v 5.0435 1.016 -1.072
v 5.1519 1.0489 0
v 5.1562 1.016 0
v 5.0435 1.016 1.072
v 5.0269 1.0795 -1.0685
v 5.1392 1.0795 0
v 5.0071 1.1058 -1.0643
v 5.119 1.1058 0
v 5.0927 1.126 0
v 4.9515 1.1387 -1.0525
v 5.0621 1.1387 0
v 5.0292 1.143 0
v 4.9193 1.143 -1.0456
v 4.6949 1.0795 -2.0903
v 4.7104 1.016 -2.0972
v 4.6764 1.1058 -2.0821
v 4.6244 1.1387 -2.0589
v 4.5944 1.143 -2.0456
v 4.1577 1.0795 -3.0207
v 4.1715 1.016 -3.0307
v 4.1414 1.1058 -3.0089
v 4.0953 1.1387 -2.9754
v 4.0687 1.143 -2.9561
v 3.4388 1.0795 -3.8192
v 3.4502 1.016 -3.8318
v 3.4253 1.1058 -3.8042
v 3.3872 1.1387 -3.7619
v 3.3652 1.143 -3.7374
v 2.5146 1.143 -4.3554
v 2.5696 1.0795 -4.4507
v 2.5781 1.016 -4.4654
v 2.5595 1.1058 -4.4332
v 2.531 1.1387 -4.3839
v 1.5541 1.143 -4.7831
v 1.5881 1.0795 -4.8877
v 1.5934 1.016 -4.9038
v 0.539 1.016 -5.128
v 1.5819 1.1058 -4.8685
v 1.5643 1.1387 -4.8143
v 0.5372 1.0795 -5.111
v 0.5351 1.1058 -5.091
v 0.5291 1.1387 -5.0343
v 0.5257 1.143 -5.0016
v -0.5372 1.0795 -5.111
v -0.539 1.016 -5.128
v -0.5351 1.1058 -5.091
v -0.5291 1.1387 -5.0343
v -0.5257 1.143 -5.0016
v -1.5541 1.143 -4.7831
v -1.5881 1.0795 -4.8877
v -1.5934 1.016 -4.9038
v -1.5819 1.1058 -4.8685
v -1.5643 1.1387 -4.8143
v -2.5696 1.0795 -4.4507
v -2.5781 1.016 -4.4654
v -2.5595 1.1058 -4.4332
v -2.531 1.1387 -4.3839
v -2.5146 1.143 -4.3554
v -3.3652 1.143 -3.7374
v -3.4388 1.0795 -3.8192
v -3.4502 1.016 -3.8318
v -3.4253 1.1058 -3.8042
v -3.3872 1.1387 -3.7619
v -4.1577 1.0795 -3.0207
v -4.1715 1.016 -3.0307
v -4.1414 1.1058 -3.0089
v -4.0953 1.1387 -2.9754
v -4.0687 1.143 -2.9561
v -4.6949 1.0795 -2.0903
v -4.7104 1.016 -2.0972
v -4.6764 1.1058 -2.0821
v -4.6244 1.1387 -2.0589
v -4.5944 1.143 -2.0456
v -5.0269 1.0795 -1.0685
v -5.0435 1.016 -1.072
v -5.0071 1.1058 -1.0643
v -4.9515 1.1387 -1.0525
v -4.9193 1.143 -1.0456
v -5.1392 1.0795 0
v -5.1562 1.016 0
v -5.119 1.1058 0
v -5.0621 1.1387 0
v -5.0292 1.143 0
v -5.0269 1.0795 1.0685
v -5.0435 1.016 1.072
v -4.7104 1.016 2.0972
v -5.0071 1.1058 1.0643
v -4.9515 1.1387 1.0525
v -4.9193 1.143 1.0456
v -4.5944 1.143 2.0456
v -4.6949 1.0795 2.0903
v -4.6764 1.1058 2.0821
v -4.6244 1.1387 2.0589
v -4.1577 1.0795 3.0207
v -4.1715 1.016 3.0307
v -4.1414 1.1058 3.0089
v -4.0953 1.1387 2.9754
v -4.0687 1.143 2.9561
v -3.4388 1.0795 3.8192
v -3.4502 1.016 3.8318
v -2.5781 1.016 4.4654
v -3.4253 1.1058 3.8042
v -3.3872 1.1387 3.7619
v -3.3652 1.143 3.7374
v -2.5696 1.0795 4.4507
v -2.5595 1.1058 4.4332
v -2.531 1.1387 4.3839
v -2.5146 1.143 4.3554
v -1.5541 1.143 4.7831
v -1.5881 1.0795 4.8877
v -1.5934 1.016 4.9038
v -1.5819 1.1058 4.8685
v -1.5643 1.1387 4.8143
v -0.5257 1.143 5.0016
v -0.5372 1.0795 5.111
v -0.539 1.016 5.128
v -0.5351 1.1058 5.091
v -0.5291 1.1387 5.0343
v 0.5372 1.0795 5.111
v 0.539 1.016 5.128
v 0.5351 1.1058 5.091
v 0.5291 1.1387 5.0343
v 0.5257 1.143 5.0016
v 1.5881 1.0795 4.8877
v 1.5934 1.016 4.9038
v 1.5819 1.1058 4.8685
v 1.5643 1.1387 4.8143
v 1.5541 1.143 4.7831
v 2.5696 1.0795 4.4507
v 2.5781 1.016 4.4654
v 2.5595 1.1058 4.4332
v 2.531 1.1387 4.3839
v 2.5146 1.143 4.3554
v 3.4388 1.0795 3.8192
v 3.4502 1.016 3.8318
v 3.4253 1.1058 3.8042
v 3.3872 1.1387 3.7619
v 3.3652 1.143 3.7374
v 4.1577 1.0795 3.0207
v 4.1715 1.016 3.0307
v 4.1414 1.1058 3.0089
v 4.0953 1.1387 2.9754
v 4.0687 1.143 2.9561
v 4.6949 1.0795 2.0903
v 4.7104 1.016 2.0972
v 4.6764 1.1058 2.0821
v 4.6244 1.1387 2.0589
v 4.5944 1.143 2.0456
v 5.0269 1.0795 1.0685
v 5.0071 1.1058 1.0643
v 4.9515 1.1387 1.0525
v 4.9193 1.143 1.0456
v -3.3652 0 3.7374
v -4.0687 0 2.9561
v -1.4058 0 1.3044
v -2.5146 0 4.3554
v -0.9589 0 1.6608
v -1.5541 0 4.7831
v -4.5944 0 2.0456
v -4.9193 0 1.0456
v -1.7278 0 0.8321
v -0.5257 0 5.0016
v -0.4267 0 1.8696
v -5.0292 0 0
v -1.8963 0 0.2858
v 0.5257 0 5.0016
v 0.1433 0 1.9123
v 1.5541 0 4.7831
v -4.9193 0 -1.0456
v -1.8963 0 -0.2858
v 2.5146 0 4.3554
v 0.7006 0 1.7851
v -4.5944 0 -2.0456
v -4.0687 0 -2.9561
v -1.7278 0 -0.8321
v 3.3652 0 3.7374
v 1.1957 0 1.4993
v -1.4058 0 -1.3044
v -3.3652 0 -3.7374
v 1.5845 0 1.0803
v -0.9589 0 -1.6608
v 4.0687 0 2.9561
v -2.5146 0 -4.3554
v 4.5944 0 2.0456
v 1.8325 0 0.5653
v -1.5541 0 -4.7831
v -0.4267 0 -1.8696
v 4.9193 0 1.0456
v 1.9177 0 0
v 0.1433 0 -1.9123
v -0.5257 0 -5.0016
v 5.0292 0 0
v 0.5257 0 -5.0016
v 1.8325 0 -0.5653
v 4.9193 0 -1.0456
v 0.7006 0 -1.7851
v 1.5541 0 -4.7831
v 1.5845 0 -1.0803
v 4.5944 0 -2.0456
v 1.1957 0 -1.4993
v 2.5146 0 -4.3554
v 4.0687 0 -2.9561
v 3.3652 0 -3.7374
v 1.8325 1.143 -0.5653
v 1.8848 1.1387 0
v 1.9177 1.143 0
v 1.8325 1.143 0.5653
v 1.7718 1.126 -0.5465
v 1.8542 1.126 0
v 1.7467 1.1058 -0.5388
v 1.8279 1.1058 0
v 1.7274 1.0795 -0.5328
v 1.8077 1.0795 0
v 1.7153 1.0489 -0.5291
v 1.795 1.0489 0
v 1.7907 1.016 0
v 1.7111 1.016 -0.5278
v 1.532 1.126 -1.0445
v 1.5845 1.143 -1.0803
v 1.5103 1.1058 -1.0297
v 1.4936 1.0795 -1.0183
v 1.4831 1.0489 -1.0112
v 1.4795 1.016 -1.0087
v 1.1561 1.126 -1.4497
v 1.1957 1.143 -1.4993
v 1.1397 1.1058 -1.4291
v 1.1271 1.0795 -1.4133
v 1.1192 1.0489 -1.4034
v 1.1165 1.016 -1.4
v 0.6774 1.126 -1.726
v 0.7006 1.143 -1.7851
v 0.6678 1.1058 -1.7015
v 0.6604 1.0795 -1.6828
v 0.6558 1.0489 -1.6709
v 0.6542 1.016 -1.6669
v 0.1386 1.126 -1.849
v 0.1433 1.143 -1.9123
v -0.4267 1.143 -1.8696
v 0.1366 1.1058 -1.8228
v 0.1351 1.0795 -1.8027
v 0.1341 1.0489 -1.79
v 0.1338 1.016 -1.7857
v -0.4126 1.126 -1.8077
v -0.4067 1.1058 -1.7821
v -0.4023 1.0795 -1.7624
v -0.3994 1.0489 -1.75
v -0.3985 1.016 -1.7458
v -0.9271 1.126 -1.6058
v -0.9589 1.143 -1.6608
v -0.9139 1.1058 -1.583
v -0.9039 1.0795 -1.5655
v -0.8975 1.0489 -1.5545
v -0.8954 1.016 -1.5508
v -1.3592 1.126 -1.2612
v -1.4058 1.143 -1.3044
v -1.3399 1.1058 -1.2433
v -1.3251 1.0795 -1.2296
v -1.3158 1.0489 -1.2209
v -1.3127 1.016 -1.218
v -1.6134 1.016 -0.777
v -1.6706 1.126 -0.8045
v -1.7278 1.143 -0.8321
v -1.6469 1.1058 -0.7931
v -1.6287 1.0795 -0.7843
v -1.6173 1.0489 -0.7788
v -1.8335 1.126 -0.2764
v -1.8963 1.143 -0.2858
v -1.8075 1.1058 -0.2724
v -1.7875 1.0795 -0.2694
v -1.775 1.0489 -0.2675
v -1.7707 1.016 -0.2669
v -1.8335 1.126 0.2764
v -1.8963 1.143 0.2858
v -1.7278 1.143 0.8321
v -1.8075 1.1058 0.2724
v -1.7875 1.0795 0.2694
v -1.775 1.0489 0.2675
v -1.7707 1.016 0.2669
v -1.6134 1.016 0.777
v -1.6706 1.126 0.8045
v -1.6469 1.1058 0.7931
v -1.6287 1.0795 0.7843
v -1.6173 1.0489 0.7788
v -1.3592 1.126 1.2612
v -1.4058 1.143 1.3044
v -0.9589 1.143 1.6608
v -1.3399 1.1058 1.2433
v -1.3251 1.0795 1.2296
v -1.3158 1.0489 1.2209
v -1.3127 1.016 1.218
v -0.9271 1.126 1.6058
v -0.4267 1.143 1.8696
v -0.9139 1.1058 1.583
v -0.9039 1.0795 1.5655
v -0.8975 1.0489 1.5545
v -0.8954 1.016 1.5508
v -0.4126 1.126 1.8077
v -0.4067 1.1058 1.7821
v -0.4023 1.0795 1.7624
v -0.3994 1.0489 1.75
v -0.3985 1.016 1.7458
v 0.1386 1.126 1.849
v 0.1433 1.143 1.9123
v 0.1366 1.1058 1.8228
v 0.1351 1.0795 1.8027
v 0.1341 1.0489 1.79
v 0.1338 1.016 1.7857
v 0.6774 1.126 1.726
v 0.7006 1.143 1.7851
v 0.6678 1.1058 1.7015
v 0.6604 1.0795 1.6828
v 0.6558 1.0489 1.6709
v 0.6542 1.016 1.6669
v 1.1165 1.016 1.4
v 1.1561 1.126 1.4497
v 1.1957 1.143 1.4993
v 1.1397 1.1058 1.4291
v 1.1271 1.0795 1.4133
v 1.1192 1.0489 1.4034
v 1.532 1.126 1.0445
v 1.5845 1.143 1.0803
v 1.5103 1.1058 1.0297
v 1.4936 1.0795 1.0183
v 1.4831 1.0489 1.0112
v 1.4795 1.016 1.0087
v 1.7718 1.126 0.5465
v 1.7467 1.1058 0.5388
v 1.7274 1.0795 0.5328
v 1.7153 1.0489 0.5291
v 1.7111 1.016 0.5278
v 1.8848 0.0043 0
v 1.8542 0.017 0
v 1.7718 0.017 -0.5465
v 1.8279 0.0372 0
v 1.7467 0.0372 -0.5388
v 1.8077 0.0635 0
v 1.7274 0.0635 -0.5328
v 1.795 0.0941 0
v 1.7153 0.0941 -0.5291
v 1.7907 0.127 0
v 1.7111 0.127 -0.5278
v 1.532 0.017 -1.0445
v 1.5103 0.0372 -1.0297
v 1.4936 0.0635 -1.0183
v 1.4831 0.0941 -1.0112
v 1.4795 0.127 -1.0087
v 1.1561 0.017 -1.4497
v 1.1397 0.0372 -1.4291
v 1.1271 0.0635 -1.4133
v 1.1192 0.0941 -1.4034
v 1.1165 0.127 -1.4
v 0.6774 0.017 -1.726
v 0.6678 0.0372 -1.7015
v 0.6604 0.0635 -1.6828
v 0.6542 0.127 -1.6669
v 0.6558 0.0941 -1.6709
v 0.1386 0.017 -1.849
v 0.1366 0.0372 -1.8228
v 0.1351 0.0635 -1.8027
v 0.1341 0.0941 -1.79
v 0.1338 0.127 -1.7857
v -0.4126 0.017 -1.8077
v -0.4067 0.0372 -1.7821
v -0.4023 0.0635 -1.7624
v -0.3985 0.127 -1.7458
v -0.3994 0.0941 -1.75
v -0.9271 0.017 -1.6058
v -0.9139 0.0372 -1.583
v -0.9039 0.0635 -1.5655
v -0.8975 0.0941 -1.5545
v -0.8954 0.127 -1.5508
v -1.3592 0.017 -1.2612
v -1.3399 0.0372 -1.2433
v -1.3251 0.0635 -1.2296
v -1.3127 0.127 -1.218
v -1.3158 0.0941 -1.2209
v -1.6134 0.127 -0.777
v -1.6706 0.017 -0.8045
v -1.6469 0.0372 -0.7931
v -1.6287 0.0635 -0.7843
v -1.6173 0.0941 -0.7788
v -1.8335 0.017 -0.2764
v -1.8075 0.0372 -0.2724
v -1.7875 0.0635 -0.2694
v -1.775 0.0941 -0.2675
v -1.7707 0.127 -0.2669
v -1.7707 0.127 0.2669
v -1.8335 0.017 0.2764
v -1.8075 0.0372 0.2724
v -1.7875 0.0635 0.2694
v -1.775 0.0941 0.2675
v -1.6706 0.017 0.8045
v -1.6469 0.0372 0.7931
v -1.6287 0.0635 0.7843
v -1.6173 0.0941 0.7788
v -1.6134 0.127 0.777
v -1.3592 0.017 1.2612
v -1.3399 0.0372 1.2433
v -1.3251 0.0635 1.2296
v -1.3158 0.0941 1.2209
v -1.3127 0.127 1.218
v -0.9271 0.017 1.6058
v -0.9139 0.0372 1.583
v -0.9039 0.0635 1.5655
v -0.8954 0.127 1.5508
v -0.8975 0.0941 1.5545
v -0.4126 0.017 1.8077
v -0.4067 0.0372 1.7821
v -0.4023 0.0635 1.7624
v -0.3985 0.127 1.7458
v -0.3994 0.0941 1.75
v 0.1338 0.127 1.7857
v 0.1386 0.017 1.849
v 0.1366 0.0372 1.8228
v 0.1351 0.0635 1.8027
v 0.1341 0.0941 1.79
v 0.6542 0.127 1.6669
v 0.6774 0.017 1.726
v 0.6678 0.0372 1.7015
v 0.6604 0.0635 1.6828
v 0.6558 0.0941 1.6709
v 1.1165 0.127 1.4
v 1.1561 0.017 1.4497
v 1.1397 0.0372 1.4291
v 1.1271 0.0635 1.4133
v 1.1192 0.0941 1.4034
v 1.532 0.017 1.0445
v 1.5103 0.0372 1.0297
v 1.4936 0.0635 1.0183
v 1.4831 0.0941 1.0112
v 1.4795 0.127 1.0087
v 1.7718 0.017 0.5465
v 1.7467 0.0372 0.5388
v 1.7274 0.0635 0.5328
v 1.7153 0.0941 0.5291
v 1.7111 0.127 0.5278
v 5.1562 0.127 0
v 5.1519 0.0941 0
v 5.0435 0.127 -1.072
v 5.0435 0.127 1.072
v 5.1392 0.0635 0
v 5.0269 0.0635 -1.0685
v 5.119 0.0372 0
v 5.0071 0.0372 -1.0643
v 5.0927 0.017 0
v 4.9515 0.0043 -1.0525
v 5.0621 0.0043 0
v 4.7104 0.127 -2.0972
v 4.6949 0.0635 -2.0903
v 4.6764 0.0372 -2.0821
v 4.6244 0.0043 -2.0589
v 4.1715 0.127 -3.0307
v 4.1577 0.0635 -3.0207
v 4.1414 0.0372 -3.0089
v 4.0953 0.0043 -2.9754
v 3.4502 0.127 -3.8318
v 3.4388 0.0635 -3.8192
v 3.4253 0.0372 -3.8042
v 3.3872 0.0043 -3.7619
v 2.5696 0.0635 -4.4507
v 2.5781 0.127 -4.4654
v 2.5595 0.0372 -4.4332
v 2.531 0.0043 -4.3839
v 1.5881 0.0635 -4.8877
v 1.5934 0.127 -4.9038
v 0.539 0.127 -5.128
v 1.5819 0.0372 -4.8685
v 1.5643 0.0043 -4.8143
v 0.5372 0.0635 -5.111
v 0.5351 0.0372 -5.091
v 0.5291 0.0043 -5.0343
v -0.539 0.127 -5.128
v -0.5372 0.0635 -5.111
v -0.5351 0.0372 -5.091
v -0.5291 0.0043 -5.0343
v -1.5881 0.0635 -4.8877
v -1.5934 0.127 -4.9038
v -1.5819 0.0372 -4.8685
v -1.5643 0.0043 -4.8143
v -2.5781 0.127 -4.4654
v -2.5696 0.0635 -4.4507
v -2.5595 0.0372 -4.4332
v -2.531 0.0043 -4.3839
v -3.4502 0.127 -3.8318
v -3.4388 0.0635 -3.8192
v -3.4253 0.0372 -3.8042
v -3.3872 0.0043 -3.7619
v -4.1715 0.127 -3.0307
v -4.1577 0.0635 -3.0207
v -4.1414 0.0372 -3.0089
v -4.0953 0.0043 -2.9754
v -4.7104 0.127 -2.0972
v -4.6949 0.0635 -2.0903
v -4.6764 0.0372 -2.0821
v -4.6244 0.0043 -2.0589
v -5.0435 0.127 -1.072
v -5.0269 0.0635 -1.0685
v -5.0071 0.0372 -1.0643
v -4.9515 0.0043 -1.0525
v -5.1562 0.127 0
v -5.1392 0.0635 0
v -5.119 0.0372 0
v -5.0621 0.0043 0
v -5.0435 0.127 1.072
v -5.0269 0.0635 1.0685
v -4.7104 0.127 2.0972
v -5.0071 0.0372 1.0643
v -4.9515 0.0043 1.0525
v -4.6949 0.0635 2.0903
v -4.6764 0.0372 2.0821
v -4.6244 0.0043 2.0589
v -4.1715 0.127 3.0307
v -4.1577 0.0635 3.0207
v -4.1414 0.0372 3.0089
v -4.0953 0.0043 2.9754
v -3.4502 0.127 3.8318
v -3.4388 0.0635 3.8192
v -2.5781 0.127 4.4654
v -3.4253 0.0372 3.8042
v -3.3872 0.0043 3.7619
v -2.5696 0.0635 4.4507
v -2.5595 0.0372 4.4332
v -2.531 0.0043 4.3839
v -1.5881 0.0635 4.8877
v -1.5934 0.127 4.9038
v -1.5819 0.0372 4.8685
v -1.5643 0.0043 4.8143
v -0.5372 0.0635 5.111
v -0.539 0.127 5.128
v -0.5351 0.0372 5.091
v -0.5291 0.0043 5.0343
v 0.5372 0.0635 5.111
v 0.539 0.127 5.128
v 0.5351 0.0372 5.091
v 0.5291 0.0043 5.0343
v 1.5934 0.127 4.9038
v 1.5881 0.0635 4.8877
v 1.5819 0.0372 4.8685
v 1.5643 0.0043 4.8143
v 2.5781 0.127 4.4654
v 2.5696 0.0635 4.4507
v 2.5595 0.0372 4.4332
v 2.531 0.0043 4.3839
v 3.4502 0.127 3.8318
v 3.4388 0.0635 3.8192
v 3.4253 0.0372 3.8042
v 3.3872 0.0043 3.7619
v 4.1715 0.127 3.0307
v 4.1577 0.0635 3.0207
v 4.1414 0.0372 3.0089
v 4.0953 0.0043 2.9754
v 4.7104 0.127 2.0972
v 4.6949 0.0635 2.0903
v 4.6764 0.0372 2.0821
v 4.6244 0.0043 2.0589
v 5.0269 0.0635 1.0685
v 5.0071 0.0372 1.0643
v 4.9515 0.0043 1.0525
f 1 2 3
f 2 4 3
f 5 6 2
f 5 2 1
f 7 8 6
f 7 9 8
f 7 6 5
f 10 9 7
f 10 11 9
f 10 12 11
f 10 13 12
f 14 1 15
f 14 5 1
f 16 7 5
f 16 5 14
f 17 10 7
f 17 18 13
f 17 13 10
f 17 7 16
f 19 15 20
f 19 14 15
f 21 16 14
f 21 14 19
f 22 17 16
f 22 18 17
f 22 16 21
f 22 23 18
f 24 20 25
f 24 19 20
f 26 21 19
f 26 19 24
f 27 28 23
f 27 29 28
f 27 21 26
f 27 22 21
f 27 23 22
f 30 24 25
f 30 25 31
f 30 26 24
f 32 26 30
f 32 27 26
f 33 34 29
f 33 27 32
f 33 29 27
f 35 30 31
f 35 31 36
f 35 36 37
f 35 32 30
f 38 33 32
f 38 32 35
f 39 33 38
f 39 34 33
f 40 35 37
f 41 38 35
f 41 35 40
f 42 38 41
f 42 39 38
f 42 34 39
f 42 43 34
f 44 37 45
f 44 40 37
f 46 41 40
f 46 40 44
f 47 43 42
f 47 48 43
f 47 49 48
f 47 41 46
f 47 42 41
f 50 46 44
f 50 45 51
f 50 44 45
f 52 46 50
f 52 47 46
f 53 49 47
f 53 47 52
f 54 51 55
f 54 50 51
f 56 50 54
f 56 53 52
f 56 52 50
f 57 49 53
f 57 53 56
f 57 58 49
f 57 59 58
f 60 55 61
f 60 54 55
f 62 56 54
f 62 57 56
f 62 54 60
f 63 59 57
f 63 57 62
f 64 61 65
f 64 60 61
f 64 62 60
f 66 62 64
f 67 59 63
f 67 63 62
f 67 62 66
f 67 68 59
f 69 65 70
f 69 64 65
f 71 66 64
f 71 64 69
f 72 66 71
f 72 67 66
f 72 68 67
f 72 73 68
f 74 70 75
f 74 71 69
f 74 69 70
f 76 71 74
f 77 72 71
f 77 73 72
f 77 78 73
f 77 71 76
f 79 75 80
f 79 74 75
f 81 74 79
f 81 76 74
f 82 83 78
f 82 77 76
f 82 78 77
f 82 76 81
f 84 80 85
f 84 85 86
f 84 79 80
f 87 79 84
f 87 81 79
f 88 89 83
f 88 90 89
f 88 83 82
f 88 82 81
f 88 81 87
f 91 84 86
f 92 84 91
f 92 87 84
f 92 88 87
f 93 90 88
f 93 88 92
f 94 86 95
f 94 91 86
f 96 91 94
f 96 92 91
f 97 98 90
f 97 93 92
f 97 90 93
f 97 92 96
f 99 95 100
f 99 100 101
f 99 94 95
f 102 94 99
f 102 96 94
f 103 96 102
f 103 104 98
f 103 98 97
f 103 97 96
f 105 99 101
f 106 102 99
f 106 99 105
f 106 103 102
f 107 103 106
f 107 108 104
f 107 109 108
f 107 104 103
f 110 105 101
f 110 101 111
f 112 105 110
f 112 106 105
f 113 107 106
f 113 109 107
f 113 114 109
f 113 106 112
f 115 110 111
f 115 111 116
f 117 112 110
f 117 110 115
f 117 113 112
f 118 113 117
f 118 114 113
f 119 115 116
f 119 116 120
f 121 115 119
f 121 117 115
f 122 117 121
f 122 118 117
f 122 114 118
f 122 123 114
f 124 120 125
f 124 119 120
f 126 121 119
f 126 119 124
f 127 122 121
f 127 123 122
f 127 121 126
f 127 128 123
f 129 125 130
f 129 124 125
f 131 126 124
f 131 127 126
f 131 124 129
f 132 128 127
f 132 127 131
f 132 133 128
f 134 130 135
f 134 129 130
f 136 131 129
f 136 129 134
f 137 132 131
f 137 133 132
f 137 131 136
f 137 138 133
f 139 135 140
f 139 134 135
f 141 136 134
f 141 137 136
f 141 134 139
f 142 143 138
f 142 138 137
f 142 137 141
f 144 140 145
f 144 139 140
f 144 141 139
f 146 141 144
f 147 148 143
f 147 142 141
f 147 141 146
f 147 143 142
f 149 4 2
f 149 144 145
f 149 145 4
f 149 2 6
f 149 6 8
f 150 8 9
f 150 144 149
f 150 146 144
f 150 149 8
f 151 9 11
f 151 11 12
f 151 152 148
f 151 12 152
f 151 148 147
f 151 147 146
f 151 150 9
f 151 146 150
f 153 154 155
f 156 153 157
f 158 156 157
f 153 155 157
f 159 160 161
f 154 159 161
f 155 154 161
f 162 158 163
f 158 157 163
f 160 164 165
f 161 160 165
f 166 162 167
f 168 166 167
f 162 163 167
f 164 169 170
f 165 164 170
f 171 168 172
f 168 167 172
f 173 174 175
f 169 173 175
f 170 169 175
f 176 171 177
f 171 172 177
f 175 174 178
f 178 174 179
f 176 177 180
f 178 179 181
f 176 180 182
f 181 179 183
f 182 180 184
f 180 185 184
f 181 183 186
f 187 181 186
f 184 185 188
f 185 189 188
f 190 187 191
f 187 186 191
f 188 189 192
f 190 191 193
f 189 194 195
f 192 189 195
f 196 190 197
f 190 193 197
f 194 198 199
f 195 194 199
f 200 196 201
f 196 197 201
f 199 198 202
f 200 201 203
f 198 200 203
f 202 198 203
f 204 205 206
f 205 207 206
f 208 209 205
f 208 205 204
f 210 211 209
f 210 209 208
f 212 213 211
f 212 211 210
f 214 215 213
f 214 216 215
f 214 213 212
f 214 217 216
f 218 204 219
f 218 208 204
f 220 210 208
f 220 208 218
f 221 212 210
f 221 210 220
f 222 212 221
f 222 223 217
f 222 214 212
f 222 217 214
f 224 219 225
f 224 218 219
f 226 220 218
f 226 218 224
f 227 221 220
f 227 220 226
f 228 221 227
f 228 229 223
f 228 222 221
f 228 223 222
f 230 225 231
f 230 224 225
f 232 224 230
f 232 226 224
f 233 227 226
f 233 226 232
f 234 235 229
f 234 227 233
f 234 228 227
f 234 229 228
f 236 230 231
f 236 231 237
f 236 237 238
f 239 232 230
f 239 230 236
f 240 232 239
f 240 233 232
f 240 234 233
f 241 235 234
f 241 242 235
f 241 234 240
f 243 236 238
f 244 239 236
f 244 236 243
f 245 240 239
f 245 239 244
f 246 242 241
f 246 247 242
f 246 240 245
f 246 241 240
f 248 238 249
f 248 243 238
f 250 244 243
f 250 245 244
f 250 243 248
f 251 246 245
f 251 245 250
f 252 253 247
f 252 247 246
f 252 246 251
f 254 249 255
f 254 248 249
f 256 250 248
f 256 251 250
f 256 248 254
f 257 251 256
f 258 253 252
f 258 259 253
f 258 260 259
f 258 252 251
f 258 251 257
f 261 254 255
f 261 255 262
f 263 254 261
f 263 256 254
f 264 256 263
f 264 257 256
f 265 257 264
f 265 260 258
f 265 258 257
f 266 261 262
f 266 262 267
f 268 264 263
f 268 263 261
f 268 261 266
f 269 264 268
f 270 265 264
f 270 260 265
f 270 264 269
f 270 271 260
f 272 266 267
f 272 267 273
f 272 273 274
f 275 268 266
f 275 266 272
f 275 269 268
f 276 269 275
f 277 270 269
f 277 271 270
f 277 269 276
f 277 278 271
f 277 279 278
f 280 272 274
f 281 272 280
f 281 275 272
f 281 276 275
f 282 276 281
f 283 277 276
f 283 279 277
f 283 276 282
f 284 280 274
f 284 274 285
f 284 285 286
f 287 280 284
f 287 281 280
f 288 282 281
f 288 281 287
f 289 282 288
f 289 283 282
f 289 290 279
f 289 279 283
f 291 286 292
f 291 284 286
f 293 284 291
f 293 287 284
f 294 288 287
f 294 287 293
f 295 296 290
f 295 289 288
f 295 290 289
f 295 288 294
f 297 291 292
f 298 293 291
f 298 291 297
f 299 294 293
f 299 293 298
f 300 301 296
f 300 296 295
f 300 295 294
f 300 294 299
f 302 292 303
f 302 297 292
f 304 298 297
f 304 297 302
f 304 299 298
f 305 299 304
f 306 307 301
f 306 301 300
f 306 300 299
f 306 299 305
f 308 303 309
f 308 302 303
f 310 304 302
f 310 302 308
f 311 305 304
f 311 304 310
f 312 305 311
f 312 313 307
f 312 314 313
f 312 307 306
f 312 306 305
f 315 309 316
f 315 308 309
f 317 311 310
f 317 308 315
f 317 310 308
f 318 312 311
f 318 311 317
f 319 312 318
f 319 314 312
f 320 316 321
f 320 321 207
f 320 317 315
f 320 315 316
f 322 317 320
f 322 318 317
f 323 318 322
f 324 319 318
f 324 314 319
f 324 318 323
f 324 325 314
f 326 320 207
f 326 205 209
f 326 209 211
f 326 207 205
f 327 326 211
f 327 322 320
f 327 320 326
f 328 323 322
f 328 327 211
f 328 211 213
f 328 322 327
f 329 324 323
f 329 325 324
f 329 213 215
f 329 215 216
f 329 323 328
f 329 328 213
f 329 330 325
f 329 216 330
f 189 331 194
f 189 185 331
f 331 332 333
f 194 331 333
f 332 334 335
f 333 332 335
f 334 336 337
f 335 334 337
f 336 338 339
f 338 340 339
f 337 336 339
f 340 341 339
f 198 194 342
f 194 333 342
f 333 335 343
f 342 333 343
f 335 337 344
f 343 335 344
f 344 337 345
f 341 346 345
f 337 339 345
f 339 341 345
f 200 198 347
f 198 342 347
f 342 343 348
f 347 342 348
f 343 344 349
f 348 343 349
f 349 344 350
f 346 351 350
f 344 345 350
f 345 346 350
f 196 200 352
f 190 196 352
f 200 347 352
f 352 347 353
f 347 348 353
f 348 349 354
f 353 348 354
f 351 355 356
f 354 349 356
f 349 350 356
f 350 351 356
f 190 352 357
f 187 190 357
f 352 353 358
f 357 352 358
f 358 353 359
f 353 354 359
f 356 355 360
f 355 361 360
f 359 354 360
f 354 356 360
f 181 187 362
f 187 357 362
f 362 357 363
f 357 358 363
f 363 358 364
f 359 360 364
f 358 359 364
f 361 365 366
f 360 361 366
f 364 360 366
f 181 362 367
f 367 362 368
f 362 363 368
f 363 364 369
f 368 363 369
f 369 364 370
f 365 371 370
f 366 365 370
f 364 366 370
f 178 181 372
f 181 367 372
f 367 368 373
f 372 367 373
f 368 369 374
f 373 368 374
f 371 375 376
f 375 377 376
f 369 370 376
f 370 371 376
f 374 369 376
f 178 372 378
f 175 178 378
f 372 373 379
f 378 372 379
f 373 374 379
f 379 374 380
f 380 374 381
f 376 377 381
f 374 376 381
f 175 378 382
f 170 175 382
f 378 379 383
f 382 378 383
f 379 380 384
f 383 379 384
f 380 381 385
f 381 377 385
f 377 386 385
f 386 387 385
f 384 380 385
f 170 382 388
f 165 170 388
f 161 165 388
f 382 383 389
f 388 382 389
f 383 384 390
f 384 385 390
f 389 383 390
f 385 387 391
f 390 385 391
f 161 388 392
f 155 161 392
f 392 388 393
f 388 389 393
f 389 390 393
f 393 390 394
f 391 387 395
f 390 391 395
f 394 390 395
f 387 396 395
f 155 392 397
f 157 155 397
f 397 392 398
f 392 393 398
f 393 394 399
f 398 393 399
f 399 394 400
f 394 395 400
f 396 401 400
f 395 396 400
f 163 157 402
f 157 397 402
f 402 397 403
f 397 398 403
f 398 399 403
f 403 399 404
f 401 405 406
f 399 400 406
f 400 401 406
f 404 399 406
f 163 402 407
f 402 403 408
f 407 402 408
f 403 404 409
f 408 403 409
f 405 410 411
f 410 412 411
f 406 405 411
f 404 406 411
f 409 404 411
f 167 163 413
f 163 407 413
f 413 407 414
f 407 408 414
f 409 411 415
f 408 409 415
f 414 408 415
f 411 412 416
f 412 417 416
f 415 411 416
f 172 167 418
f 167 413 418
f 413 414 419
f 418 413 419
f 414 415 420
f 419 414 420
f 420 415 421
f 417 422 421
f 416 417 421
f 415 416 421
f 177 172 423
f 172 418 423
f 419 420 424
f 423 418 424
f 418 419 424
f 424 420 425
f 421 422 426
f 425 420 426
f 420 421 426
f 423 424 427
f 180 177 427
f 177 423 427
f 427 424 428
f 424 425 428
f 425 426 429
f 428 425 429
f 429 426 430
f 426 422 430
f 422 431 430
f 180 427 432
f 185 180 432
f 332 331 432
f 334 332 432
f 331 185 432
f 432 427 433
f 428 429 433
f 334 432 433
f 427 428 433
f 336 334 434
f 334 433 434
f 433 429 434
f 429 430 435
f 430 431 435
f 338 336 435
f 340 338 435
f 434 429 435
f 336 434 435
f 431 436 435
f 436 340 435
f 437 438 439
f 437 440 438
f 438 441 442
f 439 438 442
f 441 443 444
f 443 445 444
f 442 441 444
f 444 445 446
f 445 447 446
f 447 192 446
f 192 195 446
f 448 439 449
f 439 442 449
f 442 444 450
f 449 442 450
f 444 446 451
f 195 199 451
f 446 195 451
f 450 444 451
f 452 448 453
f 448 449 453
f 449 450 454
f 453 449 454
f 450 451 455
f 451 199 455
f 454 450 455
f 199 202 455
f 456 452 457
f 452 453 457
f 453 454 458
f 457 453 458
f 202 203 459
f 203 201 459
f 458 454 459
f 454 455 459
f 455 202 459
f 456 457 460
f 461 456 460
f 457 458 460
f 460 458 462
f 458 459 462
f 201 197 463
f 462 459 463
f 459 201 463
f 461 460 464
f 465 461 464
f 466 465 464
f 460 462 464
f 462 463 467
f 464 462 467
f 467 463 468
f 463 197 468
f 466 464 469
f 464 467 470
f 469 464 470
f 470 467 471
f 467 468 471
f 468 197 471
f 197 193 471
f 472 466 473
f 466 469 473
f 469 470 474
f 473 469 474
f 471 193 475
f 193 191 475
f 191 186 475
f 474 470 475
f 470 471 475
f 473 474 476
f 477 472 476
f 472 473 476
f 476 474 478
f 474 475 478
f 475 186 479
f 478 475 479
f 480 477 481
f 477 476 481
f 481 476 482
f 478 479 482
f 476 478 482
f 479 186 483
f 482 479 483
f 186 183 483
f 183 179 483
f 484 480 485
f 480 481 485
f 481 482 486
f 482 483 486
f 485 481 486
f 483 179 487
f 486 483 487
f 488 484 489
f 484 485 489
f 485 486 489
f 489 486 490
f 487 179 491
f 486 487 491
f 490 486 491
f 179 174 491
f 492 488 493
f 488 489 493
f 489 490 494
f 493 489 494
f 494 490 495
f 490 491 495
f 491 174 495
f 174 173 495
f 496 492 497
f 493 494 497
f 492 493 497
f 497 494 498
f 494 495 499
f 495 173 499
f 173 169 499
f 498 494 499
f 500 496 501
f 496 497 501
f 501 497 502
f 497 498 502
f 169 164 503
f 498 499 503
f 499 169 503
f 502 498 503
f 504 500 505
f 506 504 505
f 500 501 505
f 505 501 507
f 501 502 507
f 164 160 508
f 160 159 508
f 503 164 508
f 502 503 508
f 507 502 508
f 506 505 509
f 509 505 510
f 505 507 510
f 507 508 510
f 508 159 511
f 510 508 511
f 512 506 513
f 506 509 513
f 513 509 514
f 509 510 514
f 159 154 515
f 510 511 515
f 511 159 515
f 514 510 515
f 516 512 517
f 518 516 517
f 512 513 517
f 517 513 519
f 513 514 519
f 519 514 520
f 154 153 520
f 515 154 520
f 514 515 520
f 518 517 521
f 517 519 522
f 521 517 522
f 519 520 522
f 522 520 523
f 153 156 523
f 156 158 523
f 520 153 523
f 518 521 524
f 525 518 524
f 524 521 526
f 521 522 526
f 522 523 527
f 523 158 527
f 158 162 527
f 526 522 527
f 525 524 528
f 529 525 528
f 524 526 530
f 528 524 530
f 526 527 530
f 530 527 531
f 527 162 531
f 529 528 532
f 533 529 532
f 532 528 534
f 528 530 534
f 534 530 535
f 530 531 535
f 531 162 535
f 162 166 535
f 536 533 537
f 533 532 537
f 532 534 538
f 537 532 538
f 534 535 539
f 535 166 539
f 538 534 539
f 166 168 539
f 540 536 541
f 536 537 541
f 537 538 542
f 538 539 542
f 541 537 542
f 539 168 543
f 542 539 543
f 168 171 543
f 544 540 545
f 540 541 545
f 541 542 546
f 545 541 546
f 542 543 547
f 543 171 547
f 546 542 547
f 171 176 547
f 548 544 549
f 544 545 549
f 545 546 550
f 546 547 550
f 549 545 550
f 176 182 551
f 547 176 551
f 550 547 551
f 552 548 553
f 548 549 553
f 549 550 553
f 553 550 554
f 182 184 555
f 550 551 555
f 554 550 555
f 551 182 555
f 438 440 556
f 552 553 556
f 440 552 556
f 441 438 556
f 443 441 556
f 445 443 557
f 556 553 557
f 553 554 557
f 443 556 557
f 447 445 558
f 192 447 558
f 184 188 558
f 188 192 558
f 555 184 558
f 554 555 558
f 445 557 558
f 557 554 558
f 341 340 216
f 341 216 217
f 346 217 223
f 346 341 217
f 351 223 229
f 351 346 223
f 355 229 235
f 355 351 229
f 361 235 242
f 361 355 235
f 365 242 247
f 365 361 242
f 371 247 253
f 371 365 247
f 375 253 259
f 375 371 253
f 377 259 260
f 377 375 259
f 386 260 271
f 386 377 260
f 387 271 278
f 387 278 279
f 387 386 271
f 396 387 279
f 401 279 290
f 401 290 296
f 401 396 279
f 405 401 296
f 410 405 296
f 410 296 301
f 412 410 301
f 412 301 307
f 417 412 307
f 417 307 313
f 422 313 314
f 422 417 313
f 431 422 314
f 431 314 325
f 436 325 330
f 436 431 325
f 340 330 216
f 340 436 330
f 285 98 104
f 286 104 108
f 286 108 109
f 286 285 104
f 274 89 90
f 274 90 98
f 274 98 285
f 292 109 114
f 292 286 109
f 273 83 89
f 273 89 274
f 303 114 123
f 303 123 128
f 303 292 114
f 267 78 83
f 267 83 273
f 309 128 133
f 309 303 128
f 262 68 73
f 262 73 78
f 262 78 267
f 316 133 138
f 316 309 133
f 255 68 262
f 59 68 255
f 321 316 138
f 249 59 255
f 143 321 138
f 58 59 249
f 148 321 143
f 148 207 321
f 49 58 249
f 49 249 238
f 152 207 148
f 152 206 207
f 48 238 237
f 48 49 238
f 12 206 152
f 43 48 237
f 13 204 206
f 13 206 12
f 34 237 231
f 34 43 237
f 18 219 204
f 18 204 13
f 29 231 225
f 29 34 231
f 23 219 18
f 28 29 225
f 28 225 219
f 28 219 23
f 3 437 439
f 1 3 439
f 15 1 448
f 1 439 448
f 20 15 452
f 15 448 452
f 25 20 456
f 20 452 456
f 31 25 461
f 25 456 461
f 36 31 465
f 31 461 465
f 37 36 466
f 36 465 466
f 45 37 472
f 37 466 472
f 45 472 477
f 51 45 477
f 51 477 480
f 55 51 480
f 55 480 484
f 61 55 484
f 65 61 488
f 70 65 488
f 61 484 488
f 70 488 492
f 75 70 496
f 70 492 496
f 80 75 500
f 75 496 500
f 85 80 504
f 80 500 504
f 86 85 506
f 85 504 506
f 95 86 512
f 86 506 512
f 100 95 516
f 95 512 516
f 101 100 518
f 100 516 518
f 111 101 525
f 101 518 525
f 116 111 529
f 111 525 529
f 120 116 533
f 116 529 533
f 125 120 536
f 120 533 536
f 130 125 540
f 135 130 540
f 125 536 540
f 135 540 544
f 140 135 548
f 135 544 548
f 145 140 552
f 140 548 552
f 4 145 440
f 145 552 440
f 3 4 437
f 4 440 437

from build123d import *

# Parameters (mm, degrees)
SKETCH1_R           = 5.1562
SKETCH1_R_2         = 1.7907
BOSS_EXTRUDE1_DEPTH = 1.143
FILLET1_R           = 0.127
FILLET2_R           = 0.127
FILLET3_R           = 0.127


with BuildPart() as part:
    # Sketch1 → Boss-Extrude1 (new body)
    with BuildSketch(Plane(origin=(0, 0, 0), x_dir=(1, 0, 0), z_dir=(0, 1, 0))):
        Circle(SKETCH1_R)
        Circle(SKETCH1_R_2, mode=Mode.SUBTRACT)
    extrude(amount=BOSS_EXTRUDE1_DEPTH)

    # Fillet1
    fillet1_edges = [part.edges().sort_by_distance(p)[0] for p in [
        (-5.1562, 1.143, 0),
    ]]
    fillet(fillet1_edges, radius=FILLET1_R)

    # Fillet2
    fillet2_edges = [part.edges().sort_by_distance(p)[0] for p in [
        (-5.1562, 0, 0),
    ]]
    fillet(fillet2_edges, radius=FILLET2_R)

    # Fillet3
    fillet3_edges = [part.edges().sort_by_distance(p)[0] for p in [
        (-1.7907, 0, 0),
        (-1.7907, 1.143, 0),
    ]]
    fillet(fillet3_edges, radius=FILLET3_R)


solid = part.part
